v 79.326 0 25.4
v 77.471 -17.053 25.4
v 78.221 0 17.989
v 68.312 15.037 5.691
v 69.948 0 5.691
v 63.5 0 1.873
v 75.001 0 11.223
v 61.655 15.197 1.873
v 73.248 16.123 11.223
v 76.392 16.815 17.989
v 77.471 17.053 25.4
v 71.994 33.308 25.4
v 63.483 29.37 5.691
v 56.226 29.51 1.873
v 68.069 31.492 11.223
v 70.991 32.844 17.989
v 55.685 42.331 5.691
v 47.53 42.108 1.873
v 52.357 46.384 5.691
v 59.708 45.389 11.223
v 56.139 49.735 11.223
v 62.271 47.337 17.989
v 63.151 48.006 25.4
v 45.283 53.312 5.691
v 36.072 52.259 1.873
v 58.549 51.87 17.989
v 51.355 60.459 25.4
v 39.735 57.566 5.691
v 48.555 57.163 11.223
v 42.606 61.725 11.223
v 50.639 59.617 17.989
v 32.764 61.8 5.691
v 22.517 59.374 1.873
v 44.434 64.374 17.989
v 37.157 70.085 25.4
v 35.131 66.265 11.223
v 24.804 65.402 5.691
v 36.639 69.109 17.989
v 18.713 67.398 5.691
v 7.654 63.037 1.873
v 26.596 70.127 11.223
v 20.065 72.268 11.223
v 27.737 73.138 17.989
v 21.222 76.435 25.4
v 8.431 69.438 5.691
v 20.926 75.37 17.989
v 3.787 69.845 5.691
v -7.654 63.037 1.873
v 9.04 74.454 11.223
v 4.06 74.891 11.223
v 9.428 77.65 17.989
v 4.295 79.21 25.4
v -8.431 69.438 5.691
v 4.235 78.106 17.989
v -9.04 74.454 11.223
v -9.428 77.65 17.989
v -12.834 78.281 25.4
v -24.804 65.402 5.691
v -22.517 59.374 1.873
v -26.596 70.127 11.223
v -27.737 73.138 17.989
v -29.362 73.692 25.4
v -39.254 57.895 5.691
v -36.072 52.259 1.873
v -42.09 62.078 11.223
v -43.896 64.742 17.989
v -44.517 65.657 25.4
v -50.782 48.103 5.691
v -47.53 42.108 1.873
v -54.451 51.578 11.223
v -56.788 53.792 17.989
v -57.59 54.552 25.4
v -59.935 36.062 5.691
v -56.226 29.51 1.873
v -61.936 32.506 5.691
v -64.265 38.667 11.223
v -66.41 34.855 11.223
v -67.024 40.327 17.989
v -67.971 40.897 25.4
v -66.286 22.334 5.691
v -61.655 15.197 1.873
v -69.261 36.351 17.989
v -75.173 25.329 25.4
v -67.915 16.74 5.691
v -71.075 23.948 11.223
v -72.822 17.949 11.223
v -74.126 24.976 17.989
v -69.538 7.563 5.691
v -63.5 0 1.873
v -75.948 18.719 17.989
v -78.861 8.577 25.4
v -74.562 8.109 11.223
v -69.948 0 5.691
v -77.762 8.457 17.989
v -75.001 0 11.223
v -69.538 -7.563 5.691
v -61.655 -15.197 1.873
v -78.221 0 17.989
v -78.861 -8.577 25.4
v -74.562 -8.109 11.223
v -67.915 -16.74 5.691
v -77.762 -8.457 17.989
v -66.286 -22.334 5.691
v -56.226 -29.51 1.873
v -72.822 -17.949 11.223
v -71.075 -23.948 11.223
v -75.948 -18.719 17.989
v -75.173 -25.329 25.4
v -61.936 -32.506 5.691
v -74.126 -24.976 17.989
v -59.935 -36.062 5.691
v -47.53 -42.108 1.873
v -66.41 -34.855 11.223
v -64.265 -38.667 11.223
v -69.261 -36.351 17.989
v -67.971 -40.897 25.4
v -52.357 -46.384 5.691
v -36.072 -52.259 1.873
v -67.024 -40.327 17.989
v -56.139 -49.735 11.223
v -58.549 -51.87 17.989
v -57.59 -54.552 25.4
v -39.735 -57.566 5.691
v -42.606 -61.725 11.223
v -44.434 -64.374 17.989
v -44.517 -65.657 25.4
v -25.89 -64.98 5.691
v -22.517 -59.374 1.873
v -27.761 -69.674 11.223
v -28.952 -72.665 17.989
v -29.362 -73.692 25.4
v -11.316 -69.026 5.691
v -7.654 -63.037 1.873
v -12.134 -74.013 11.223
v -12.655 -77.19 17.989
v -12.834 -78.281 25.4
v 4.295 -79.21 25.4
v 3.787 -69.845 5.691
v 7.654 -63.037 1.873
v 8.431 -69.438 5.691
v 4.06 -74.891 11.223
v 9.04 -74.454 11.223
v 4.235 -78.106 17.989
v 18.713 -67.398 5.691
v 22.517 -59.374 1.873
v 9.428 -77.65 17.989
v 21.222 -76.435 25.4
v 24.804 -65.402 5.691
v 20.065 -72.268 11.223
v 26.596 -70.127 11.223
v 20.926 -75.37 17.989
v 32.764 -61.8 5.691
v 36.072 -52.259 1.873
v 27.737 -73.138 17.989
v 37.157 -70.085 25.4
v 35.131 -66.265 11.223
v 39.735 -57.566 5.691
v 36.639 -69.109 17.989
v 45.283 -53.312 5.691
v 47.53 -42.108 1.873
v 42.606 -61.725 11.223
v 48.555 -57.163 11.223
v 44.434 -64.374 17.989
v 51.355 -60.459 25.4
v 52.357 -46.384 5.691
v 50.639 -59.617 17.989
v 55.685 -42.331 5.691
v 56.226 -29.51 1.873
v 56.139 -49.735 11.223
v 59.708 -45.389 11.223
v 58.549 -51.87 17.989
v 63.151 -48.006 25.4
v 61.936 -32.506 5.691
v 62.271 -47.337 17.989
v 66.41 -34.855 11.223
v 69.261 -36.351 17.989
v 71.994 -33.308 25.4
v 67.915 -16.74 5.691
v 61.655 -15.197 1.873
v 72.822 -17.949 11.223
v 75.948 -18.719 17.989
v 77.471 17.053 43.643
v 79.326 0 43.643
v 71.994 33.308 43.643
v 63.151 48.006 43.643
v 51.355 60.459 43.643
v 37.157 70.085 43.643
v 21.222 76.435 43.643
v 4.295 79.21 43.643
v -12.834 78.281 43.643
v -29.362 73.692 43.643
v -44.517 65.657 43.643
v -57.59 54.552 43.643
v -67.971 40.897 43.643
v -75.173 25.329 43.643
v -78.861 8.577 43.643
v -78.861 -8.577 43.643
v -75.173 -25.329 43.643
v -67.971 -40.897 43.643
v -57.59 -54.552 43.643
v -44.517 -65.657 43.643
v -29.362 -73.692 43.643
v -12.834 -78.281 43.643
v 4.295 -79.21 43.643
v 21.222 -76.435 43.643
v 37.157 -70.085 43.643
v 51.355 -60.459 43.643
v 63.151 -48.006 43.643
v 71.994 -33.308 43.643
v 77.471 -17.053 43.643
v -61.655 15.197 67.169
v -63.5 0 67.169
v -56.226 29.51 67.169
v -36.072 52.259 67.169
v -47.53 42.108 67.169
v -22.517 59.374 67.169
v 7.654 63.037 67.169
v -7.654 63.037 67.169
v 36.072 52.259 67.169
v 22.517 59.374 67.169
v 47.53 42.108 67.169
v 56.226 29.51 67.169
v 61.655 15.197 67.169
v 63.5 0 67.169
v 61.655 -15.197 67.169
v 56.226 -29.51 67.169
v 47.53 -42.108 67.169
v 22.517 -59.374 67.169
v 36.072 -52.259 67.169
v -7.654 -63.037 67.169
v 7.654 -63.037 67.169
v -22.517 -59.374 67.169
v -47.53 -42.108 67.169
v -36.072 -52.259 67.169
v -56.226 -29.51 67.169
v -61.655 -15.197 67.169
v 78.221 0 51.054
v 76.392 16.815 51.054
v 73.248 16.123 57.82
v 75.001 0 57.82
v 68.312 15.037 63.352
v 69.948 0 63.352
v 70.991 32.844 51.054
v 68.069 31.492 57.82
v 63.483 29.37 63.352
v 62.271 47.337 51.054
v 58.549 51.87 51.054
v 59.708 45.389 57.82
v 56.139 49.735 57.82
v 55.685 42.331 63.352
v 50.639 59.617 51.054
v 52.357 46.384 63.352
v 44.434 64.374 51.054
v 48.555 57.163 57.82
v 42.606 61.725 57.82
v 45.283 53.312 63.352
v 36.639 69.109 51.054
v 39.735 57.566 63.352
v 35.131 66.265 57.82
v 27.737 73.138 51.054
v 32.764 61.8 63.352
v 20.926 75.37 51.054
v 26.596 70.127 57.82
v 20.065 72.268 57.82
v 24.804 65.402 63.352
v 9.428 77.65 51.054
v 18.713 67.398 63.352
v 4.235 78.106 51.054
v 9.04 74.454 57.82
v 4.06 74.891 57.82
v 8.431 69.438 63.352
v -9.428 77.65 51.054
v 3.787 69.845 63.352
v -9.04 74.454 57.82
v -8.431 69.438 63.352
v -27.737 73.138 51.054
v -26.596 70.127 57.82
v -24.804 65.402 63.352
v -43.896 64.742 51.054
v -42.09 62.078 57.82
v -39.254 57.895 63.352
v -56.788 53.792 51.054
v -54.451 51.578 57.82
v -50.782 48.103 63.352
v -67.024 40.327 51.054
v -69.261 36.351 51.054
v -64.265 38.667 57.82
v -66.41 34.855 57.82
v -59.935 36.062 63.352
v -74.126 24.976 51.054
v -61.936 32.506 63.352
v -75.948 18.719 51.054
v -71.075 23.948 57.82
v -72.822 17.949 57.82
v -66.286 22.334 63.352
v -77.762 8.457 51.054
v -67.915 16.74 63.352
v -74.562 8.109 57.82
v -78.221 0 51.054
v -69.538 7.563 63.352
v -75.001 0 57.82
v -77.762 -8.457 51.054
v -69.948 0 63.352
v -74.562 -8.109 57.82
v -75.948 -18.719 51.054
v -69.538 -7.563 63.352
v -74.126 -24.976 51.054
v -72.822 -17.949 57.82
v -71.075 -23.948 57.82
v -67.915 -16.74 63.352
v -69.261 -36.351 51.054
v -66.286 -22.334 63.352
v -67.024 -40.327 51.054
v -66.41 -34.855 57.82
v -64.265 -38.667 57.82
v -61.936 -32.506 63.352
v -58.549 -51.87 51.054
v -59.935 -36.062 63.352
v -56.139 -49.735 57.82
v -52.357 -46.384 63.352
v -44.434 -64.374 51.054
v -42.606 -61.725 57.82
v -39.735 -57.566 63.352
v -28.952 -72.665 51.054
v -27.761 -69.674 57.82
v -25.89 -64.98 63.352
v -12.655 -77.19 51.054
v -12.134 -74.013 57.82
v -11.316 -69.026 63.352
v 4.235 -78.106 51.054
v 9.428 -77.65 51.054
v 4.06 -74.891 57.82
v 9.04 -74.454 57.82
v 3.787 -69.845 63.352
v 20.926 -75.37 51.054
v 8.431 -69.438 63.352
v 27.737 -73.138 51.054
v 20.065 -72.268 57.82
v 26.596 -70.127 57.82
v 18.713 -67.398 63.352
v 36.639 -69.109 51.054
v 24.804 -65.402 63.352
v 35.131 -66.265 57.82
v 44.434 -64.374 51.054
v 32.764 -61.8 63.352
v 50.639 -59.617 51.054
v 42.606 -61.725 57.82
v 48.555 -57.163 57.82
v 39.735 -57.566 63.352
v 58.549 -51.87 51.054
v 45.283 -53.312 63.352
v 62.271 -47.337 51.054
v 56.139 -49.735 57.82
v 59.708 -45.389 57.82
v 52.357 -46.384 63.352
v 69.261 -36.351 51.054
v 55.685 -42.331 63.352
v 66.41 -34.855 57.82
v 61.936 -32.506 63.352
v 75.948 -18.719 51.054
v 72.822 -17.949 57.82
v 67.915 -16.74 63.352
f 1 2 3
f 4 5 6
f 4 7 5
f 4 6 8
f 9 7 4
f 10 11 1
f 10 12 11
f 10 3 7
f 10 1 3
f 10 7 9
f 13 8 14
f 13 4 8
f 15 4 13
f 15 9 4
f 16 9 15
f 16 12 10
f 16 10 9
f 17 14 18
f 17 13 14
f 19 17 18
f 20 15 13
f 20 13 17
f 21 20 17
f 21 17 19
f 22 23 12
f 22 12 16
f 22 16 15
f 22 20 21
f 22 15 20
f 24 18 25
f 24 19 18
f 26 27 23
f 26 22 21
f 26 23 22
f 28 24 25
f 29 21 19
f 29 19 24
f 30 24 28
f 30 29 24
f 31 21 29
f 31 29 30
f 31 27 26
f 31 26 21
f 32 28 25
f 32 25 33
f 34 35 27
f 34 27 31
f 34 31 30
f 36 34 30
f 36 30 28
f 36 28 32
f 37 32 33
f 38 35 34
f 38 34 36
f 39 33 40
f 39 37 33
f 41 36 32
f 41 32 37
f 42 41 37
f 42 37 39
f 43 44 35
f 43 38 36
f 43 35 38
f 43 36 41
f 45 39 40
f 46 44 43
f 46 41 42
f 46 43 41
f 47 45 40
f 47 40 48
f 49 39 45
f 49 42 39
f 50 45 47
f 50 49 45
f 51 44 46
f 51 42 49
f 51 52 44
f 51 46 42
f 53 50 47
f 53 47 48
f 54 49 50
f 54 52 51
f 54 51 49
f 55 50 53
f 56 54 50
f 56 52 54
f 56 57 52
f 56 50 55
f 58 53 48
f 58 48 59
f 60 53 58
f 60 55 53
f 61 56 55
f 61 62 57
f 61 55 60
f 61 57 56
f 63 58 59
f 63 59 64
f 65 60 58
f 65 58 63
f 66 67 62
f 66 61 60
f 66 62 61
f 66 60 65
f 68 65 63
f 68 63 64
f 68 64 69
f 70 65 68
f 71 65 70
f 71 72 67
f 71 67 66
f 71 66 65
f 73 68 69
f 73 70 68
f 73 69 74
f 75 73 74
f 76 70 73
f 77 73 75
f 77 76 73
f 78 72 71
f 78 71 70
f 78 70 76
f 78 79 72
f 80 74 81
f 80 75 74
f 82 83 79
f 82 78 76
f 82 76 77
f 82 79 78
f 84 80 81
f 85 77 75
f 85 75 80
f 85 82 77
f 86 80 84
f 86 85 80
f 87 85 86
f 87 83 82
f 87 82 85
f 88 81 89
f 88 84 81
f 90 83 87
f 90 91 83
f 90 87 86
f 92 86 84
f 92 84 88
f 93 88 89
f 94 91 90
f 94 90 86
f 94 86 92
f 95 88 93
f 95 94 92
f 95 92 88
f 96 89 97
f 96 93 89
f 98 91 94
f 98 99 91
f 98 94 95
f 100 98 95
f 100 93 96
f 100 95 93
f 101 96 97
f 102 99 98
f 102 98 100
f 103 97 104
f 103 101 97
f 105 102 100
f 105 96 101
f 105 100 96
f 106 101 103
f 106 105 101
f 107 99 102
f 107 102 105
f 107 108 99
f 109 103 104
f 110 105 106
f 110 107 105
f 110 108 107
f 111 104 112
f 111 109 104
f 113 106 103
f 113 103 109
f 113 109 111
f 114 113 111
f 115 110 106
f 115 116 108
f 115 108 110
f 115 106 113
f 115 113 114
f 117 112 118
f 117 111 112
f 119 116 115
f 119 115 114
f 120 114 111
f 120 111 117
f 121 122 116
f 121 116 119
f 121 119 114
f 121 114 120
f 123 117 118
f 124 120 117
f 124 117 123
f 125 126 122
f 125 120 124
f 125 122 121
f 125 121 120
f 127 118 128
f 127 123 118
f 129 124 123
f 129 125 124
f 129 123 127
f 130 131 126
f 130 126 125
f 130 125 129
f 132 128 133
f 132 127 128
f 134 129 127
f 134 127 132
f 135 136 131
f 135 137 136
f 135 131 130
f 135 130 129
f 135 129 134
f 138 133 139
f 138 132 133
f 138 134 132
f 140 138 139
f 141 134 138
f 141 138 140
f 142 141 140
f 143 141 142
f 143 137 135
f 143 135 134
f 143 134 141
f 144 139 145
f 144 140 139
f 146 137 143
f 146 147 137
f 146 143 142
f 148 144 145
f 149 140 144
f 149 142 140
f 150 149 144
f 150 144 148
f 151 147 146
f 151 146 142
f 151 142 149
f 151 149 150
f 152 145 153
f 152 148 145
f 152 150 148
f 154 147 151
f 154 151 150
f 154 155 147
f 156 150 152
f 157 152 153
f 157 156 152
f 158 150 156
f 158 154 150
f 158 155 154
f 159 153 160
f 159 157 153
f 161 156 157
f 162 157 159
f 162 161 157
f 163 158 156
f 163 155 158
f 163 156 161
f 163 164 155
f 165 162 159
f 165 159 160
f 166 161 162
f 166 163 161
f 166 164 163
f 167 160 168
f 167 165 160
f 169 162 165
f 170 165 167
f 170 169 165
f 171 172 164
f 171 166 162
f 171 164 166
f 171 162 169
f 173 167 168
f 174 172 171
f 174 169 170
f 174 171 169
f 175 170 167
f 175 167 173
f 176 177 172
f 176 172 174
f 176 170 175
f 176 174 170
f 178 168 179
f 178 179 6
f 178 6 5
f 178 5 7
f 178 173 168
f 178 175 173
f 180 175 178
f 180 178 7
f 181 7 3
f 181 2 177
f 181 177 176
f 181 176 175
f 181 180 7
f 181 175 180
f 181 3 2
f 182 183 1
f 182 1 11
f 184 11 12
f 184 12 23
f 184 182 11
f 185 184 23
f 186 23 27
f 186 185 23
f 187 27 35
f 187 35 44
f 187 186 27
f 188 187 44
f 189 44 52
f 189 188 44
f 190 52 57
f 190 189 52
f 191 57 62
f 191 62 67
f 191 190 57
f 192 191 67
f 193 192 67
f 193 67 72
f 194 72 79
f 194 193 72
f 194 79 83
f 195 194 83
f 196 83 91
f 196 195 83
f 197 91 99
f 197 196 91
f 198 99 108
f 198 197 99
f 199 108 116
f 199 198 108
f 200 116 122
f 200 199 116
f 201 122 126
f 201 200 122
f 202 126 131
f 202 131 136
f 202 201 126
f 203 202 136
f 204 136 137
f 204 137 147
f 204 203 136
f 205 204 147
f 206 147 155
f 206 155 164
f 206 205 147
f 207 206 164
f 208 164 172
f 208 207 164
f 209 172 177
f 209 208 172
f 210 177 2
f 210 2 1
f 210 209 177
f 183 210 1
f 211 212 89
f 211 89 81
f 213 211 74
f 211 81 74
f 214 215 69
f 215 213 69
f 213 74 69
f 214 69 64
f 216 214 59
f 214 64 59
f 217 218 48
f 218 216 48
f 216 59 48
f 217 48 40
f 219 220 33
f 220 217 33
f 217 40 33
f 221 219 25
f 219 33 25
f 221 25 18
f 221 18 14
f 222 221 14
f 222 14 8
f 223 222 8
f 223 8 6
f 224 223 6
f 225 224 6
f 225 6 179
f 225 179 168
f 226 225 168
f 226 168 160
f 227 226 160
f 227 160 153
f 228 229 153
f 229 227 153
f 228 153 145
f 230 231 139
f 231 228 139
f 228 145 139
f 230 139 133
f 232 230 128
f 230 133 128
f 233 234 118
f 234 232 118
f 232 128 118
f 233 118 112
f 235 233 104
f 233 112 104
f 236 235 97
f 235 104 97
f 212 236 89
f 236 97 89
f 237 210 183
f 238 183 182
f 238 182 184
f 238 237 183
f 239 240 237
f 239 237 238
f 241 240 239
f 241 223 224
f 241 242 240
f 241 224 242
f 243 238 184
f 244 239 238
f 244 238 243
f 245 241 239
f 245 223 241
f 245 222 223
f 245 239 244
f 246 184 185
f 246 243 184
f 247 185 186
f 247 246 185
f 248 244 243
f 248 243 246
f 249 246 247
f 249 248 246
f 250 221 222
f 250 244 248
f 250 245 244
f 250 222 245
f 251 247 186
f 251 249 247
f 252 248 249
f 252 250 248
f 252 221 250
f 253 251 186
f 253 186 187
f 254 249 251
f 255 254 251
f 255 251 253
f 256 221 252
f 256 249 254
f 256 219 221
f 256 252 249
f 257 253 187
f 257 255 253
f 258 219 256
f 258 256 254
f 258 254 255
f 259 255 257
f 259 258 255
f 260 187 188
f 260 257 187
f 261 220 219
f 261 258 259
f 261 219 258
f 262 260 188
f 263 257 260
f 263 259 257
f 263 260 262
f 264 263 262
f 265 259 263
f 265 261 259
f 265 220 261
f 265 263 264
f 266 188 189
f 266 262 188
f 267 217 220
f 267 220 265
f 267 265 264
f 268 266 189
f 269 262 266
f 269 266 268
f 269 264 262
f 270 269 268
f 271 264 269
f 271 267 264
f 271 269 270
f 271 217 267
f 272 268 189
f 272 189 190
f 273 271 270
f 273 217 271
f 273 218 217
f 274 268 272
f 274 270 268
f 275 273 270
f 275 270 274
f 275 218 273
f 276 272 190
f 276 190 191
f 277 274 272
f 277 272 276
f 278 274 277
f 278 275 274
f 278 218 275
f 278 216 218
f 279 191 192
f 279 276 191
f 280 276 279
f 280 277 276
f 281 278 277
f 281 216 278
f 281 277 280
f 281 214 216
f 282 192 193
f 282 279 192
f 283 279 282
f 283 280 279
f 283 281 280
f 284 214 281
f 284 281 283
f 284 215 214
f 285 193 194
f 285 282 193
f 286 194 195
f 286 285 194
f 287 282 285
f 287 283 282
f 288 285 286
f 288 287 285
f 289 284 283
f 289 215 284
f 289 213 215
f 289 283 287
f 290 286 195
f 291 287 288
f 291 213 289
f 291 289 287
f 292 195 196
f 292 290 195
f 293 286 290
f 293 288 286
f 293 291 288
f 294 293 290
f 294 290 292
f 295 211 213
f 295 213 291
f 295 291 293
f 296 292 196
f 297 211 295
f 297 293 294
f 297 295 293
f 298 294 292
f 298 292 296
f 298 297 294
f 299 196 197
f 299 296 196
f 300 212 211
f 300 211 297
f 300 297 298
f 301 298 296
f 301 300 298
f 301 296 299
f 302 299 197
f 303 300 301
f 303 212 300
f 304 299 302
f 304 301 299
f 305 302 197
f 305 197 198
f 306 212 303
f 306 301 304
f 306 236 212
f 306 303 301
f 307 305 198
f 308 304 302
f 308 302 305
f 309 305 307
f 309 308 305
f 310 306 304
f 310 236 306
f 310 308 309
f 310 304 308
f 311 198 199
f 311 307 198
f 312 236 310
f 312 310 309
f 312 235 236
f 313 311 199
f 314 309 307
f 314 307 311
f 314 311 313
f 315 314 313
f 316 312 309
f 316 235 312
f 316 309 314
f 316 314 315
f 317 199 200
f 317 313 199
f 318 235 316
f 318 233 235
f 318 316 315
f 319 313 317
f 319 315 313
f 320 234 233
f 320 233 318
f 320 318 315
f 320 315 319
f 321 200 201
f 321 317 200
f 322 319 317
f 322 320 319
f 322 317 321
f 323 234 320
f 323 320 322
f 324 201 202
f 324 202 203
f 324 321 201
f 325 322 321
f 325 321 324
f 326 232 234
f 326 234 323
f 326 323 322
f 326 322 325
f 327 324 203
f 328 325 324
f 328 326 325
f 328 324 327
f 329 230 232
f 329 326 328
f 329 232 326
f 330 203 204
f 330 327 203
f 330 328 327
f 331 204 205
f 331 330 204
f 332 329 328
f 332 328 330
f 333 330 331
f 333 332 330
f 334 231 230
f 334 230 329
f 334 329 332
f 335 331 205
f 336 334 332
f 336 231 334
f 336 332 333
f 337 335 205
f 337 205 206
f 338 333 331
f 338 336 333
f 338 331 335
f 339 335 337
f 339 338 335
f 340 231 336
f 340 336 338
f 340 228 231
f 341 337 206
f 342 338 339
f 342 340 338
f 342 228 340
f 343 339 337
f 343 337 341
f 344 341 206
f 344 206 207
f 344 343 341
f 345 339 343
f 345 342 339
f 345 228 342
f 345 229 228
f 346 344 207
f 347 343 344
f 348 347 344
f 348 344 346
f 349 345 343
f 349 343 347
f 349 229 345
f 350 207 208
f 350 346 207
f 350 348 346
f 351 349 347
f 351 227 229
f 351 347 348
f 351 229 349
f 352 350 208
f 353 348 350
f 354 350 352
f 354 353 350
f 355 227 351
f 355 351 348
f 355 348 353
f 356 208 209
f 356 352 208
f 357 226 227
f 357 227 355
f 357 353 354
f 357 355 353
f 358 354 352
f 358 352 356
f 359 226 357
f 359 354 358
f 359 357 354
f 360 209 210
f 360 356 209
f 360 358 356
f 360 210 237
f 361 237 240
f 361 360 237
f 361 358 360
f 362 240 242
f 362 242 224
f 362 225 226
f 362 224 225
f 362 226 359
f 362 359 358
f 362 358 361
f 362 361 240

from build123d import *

# Parameters (mm, degrees)
F0_W     = 79.3259590864
F0_H     = 69.0427422523
F2_R     = 25.4
F3_DEPTH = 25.4
F5_D     = 127


with BuildPart() as f1:
    # F0 (on Front) → F1 (revolve)
    with BuildSketch(Plane.XZ):
        with Locations((39.6629795432, 34.5213711262)):
            Rectangle(F0_W, F0_H)
    revolve(axis=Axis((0, 0, 34.5213711262), (0, 0, 1)))

    # F2
    f2_edges = [f1.edges().sort_by_distance(p)[0] for p in [
        (-79.325959, 0, 0),
        (-79.325959, 0, 69.042742),
        (79.325959, 0, 34.521371),
    ]]
    fillet(f2_edges, radius=F2_R)

    # F3 (add): a face of the model
    f3_faces = [f1.faces().sort_by_distance(p)[0] for p in [
        (0, 0, 69.0427422523),
    ]]
    extrude(f3_faces, amount=F3_DEPTH)

    # F5 (through all)
    with Locations(Plane.XY.offset(94.4427422523)):
        with Locations((0, 0)):
            Hole(F5_D / 2)


solid = f1.part
